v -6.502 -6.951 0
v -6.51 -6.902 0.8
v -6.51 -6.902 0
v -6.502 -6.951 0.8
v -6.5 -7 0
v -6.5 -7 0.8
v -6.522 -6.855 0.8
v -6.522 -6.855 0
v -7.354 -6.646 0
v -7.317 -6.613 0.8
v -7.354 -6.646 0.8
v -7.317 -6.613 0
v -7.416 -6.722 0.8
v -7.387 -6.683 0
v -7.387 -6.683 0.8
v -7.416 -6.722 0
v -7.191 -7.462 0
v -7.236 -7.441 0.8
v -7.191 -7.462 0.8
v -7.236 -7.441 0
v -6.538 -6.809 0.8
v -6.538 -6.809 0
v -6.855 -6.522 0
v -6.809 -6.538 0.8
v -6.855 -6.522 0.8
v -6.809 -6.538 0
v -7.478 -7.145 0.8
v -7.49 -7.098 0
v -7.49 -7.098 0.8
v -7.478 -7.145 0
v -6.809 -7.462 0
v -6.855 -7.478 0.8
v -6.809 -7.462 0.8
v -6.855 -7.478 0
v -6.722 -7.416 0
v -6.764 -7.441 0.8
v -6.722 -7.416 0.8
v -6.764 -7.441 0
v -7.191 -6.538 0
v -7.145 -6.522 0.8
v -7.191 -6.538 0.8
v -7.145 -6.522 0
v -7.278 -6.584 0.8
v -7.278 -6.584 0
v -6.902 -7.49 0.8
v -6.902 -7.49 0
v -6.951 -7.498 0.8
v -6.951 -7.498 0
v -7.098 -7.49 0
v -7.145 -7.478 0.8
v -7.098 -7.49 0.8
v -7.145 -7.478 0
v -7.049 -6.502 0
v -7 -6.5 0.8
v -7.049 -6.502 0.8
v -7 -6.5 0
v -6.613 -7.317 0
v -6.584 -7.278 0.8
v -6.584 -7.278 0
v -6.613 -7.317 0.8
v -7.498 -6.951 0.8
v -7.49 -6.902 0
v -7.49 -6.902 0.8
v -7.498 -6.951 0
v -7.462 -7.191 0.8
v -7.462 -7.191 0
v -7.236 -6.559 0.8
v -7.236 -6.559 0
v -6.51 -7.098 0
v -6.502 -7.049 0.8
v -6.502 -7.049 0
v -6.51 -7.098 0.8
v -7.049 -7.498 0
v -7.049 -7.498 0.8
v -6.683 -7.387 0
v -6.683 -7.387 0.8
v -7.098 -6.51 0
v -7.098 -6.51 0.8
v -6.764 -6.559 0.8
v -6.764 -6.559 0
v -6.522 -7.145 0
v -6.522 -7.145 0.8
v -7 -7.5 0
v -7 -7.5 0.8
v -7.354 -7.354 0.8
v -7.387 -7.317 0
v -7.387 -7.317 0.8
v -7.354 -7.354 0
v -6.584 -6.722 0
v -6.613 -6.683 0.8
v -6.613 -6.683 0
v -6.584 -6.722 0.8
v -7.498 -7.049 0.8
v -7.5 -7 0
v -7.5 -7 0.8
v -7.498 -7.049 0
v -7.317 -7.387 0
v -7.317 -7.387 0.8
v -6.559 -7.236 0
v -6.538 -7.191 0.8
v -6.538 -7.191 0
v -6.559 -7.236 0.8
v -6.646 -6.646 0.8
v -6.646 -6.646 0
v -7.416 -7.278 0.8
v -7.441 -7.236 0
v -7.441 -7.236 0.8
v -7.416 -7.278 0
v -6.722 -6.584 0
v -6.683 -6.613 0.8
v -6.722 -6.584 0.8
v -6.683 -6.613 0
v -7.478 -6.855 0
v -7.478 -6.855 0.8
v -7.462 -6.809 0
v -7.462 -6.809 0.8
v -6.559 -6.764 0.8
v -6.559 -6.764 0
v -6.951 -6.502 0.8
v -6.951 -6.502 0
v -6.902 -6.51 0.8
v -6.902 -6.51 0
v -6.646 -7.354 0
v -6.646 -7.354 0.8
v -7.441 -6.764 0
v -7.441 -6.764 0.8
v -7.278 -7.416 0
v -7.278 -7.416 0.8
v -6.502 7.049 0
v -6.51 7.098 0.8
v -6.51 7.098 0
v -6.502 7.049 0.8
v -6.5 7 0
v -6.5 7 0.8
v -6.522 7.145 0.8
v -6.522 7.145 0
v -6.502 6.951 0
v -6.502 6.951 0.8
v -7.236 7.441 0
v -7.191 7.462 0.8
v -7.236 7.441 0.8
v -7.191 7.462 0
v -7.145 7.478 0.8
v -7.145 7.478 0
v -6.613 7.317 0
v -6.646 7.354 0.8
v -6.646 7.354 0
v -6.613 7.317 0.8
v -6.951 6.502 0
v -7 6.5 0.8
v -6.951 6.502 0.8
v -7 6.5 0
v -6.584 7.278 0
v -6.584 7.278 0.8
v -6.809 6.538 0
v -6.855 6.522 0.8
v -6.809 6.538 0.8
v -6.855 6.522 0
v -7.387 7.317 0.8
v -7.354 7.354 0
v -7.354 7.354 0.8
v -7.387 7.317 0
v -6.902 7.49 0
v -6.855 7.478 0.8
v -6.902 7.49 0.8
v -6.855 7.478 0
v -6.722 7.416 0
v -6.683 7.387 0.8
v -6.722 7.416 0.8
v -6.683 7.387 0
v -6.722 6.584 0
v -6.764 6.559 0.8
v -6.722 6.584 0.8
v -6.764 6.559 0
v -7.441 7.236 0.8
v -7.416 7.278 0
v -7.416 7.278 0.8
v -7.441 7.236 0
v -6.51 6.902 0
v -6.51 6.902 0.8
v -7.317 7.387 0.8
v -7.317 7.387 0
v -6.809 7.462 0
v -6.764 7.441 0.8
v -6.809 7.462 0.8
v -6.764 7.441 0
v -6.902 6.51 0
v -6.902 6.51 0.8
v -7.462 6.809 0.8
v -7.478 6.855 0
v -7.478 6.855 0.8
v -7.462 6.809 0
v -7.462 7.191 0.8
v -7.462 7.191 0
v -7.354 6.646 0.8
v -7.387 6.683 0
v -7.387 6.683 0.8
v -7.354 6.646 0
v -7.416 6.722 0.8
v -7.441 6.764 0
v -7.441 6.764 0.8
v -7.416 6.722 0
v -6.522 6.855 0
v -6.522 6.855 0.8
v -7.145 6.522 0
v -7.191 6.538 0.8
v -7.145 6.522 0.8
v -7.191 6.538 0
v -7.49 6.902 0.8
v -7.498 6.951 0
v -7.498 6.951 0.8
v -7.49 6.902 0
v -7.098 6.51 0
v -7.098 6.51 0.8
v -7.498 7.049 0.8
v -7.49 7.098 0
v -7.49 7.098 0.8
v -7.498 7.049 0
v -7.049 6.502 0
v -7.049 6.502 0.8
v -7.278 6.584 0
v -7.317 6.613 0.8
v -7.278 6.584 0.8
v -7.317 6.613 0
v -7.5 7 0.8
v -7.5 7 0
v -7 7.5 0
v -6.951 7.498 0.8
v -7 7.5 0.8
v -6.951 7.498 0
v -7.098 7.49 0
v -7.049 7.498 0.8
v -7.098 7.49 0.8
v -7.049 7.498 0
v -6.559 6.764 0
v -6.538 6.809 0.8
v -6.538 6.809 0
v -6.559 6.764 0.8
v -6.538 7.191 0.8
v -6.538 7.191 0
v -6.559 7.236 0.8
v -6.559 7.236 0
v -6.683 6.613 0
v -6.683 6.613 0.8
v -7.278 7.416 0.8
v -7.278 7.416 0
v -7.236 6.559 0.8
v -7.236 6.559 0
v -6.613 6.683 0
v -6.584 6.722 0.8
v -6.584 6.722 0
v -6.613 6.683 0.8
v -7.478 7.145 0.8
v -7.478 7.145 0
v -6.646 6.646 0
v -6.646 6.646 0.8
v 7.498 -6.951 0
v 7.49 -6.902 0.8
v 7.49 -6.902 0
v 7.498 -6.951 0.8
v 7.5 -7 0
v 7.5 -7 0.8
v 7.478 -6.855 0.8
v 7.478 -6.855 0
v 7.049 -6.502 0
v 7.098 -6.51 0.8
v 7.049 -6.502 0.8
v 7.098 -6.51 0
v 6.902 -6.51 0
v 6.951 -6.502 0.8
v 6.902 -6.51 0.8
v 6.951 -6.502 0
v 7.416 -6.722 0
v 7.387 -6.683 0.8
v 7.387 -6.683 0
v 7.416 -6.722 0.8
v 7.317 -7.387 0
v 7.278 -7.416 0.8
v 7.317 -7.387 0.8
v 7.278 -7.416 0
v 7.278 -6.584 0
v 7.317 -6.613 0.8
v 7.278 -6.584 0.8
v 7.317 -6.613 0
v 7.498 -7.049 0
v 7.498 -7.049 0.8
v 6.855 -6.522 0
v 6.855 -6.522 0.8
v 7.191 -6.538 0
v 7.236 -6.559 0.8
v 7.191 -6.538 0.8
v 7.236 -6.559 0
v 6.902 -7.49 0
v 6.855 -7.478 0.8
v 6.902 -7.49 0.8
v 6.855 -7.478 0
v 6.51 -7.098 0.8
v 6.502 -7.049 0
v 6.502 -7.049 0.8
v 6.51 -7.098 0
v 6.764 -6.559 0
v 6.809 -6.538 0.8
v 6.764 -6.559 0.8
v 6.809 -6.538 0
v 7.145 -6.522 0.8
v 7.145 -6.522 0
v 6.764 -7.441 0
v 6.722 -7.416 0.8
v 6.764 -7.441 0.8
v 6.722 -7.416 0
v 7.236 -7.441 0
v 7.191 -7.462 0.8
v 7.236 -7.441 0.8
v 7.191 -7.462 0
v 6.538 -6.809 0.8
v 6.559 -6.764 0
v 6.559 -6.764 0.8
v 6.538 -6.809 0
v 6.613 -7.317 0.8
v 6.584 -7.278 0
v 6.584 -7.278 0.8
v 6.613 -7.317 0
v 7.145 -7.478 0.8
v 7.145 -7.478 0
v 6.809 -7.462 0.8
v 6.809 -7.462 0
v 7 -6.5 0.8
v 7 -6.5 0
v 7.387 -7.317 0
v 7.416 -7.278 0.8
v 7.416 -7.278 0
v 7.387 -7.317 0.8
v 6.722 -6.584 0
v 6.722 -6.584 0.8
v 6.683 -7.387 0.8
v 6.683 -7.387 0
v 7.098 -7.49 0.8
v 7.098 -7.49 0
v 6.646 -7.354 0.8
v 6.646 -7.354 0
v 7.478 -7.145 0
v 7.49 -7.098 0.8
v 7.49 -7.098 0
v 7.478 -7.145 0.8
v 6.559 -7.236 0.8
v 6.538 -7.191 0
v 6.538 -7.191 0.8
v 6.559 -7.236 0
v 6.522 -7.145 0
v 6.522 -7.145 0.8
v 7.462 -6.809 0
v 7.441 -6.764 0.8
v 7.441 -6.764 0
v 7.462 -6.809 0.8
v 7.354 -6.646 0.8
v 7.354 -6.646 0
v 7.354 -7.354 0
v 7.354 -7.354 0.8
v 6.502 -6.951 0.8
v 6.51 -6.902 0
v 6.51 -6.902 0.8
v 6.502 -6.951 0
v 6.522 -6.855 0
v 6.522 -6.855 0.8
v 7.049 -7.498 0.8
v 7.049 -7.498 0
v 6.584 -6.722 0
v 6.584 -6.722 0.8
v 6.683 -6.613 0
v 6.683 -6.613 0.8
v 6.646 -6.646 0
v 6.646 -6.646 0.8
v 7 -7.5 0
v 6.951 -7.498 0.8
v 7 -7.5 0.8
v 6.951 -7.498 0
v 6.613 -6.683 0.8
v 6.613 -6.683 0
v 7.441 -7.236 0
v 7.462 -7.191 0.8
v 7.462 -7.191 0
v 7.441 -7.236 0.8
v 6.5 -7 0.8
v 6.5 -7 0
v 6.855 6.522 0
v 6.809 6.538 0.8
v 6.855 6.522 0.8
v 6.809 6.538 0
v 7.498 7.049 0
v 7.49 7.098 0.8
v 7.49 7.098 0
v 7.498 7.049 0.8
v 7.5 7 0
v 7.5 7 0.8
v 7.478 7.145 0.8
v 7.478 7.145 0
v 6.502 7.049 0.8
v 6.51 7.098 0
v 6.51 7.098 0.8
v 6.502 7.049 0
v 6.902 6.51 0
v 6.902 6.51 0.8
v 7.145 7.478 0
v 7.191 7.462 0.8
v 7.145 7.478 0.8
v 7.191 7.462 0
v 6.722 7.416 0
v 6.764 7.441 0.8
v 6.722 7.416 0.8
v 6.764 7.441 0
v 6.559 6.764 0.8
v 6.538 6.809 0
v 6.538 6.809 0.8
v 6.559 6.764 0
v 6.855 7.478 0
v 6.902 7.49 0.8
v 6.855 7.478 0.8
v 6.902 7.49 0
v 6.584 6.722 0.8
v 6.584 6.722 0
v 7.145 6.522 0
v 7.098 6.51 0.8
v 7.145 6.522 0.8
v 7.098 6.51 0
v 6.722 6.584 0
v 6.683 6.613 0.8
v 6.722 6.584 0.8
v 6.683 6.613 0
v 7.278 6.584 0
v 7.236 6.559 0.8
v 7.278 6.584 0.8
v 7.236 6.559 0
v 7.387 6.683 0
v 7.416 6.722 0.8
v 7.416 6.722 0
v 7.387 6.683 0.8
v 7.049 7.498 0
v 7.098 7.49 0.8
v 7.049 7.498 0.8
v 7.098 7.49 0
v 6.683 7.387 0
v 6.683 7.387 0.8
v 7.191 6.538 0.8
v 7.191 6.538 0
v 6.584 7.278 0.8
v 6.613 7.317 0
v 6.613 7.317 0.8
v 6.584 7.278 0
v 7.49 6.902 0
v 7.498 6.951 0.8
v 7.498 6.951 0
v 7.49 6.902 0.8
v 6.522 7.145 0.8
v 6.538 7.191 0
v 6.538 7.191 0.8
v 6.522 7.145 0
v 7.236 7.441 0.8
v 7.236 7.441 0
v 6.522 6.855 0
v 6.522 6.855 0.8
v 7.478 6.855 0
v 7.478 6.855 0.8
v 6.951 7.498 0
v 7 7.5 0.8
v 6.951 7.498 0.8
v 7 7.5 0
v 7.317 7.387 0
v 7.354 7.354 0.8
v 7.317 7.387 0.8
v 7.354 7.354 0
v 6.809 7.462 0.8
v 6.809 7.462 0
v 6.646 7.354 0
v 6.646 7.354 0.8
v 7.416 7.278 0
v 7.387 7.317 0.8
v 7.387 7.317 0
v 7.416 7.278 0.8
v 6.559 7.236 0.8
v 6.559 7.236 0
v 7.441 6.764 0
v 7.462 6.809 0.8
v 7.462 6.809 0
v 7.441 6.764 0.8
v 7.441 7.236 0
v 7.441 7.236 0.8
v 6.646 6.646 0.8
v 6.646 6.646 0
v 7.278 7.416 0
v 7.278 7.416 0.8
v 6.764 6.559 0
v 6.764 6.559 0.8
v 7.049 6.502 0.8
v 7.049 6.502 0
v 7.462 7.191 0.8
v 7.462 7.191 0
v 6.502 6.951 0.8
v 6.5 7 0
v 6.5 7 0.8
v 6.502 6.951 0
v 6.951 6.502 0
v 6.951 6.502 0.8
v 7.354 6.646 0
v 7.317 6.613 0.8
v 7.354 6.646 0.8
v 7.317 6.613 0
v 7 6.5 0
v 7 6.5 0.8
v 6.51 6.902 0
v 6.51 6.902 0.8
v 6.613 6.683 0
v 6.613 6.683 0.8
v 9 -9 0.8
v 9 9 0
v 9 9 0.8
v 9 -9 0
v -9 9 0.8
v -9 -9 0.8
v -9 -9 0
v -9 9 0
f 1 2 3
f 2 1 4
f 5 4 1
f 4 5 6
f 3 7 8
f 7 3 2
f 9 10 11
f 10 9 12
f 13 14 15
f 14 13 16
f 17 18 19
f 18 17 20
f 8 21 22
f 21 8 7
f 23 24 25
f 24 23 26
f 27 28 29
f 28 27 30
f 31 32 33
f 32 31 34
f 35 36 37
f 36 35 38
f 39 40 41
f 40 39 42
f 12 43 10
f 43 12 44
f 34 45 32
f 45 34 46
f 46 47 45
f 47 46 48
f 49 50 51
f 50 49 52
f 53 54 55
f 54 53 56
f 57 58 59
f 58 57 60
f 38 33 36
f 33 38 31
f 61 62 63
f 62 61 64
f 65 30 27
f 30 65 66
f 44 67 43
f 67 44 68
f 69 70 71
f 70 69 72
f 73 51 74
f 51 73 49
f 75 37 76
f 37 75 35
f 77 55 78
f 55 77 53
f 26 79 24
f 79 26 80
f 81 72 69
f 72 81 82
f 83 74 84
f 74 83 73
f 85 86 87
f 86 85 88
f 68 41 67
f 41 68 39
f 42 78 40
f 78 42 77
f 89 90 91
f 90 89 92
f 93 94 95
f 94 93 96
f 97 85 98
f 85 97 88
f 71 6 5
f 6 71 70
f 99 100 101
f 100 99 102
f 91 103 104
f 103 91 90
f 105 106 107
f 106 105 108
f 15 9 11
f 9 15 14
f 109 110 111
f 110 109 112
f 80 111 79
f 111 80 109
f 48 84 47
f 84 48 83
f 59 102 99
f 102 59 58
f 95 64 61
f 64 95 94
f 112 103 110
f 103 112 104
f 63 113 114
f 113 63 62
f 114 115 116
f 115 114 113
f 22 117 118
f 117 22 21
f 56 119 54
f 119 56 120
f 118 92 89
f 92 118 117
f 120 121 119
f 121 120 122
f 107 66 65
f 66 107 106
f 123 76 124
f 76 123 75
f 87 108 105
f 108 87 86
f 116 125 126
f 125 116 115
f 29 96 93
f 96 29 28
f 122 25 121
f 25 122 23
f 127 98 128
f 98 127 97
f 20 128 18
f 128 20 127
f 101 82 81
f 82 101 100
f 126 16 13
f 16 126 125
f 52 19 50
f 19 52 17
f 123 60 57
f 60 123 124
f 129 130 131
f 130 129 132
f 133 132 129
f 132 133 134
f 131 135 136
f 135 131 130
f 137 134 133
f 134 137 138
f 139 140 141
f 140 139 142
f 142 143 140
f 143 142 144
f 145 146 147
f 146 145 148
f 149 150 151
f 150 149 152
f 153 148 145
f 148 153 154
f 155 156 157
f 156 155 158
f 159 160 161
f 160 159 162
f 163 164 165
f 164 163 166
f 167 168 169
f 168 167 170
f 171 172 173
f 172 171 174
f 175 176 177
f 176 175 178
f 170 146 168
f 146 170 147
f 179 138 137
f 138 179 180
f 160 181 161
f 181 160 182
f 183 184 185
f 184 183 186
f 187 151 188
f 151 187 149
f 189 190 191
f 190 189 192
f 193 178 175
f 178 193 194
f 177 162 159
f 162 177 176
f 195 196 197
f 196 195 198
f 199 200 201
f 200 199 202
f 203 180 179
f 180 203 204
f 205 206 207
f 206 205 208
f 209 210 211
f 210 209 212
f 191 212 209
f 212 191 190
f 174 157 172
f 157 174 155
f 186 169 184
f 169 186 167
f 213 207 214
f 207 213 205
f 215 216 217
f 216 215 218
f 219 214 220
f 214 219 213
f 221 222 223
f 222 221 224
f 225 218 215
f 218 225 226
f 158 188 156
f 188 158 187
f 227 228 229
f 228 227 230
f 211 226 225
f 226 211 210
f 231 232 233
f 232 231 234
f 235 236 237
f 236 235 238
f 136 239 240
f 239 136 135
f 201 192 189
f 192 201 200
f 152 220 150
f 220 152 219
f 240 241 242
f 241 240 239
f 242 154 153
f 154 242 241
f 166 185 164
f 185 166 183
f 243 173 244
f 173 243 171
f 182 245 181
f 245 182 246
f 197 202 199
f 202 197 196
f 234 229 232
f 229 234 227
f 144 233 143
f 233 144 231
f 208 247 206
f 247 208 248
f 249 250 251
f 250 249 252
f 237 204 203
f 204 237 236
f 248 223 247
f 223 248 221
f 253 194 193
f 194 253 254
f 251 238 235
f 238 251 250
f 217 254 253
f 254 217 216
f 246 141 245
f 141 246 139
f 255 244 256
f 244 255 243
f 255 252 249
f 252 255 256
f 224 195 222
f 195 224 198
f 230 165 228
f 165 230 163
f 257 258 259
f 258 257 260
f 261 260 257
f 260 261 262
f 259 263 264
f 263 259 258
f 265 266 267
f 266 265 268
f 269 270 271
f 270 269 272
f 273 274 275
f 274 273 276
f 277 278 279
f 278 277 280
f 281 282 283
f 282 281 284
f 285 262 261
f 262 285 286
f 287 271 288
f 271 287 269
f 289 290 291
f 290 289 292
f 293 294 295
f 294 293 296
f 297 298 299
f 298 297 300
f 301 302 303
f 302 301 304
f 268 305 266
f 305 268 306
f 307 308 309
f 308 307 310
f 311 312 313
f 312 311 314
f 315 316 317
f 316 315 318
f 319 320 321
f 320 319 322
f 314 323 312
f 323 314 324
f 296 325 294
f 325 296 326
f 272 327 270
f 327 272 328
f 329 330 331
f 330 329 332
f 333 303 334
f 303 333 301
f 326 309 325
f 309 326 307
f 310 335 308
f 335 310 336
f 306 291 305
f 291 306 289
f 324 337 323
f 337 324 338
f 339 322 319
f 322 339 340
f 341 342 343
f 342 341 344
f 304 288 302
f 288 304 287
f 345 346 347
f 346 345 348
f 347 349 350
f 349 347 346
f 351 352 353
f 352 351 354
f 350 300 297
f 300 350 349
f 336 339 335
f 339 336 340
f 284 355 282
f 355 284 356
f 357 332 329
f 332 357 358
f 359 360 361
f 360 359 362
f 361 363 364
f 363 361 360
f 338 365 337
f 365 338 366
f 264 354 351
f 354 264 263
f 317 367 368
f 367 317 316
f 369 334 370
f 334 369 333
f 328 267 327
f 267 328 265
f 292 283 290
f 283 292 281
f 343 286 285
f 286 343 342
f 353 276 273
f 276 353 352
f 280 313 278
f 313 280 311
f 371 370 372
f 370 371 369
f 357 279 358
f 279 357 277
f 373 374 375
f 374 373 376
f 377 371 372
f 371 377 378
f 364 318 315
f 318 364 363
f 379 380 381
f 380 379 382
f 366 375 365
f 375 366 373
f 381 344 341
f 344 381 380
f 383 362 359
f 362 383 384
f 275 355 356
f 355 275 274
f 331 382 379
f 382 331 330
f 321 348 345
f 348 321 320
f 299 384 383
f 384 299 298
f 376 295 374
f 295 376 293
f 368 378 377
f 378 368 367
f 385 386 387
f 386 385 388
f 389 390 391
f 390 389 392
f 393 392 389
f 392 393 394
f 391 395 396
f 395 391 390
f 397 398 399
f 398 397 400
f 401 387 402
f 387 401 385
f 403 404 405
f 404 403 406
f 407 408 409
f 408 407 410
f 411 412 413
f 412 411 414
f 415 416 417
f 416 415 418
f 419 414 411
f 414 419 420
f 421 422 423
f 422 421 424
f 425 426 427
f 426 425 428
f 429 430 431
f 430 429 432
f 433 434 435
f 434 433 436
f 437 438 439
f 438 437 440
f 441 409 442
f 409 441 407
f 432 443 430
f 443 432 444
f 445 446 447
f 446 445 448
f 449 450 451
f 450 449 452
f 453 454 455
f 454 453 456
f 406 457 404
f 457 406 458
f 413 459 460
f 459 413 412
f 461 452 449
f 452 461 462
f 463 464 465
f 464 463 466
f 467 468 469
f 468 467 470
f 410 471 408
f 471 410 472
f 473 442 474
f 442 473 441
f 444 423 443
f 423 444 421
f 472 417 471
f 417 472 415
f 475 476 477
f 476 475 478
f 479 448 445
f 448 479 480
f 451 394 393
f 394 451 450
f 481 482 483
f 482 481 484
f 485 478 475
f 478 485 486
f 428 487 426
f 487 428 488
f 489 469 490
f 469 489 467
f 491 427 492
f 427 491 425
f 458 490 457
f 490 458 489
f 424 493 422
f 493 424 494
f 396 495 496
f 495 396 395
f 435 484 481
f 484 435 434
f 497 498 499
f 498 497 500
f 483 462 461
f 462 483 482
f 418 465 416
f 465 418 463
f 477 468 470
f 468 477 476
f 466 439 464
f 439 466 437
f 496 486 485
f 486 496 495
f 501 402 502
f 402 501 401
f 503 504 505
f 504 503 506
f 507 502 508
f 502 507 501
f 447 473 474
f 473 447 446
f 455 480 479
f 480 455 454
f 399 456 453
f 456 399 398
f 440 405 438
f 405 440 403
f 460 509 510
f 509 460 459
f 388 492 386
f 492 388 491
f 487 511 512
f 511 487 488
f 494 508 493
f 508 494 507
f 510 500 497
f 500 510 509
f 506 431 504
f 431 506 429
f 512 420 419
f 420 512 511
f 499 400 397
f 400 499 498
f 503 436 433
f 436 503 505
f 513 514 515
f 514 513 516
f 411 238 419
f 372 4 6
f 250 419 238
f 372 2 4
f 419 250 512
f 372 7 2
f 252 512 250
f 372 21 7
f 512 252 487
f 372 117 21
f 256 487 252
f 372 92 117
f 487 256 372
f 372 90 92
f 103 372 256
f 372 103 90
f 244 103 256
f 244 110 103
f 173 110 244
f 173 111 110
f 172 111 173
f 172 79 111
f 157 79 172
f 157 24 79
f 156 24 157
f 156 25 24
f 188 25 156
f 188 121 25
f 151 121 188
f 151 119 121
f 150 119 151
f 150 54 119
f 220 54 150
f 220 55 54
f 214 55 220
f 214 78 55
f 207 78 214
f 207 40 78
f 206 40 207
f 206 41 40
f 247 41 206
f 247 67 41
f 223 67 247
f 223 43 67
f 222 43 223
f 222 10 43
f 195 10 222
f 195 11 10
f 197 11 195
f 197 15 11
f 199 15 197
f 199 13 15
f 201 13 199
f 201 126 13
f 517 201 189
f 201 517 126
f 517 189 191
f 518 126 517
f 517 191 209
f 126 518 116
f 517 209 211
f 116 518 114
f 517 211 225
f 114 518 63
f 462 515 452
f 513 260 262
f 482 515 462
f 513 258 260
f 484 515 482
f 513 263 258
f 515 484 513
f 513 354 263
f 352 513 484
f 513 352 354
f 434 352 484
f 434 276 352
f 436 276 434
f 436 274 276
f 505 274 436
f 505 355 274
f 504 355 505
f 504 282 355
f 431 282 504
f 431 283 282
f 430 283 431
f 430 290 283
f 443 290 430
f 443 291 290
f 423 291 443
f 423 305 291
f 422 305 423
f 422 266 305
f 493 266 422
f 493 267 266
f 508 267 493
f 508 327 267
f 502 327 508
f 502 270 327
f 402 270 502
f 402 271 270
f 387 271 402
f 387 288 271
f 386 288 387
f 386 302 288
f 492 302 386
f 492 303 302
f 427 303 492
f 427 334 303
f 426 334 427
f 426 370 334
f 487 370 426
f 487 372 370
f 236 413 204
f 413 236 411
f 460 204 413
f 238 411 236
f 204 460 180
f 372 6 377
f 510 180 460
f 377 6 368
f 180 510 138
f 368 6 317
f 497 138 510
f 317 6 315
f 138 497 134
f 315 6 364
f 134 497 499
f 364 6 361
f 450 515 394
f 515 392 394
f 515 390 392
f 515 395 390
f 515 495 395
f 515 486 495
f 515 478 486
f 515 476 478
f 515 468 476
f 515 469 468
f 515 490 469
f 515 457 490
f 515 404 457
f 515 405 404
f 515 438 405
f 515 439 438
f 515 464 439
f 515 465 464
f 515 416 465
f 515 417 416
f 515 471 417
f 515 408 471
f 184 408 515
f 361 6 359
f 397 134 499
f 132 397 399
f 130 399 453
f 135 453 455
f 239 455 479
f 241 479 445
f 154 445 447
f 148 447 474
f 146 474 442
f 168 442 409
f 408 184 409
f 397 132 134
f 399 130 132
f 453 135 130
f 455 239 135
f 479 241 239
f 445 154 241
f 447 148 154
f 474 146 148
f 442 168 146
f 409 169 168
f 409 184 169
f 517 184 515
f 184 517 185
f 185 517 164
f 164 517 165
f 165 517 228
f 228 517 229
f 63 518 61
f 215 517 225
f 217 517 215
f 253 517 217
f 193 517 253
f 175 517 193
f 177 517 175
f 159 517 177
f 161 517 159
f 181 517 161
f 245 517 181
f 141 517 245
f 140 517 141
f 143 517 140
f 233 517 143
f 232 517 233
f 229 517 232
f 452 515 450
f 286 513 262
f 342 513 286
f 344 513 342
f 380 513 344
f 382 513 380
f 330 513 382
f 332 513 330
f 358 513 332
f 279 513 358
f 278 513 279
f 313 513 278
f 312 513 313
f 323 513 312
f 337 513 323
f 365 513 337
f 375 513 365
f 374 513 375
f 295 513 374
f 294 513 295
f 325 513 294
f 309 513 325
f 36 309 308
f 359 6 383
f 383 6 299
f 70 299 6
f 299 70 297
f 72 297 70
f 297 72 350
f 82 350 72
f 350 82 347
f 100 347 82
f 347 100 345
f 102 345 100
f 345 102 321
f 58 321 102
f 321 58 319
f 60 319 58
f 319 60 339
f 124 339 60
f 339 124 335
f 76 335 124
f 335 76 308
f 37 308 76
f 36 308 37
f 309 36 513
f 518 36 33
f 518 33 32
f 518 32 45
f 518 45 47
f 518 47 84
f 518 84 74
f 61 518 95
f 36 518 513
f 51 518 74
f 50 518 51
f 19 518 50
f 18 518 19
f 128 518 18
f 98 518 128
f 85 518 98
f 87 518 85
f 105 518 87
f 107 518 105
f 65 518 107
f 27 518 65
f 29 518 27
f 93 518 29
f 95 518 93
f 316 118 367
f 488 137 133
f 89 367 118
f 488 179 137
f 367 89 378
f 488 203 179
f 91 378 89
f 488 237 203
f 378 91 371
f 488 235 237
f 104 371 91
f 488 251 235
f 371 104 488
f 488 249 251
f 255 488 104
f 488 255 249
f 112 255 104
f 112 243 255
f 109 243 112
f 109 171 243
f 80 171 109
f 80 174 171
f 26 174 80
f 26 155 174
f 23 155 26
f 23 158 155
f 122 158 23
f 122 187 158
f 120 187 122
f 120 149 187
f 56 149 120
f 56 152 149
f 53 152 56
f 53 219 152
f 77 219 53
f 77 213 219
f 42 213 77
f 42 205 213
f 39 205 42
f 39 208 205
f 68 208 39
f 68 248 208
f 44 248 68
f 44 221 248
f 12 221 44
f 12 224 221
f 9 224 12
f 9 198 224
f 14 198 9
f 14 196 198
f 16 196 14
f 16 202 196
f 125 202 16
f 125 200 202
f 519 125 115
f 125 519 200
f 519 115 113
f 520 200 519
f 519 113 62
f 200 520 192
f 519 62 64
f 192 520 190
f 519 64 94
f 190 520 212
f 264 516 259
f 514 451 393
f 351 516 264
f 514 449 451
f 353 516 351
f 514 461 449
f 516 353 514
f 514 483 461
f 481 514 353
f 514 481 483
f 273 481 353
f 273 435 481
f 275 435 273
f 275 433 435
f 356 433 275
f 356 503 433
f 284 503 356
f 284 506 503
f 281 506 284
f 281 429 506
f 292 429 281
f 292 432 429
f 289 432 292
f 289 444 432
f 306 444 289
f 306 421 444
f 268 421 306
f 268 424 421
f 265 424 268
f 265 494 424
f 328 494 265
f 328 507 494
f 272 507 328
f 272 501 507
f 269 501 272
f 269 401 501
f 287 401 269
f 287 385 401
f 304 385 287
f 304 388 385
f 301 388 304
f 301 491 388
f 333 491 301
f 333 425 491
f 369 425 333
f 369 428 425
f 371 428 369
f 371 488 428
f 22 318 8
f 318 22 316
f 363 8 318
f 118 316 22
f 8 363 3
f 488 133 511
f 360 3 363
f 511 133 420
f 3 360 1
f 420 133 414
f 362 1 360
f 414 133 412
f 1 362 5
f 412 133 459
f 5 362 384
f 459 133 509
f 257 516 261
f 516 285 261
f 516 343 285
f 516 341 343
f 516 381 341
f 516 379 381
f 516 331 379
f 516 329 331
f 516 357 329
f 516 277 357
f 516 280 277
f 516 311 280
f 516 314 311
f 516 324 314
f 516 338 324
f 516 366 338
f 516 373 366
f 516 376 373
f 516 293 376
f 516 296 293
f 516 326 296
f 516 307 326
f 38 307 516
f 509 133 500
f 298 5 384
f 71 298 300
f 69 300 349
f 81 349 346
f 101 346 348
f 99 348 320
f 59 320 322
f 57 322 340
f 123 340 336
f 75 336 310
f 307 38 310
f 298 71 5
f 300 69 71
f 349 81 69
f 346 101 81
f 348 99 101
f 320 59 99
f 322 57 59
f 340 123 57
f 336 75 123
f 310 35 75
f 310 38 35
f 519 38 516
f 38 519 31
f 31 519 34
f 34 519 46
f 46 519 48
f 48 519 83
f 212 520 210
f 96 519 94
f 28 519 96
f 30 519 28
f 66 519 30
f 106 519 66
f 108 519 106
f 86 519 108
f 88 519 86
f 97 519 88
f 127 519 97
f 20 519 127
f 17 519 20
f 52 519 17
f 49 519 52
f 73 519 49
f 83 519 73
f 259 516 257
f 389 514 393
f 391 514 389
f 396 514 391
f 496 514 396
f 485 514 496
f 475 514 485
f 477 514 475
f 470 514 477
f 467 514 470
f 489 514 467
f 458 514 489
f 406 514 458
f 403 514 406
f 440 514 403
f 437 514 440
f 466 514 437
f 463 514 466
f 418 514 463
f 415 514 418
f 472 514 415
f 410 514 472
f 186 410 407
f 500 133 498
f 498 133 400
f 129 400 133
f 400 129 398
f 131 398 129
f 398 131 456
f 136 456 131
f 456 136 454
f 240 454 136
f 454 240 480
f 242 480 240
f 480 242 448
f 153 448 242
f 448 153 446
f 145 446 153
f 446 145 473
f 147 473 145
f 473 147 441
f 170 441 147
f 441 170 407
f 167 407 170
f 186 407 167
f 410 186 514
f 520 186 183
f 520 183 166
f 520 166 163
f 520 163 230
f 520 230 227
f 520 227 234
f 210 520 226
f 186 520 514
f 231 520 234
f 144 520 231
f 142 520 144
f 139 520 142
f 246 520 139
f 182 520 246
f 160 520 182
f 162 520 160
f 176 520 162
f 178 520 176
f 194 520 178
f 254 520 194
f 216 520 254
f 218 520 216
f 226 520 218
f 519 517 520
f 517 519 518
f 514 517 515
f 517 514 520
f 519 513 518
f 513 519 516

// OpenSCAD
// 18mm x 18mm PCB, 0.8mm thick — single connected solid
$fn = 64;

// Parameters
pcb_size      = 18.0;
pcb_thickness = 0.8;

// Optional mounting holes (set to 0 to disable)
hole_diameter = 1.0;
hole_offset   = 2.0;

// Main PCB solid (perfect square outline)
module pcb_solid() {
    difference() {
        // Board body: exact 18 x 18 x 0.8
        translate([0, 0, pcb_thickness/2])
            cube([pcb_size, pcb_size, pcb_thickness], center=true);

        // Mounting holes: through-holes, fully cut
        if (hole_diameter > 0) {
            for (x = [-1, 1], y = [-1, 1]) {
                translate([x*(pcb_size/2 - hole_offset),
                           y*(pcb_size/2 - hole_offset),
                           pcb_thickness/2])
                    cylinder(h=pcb_thickness + 0.2, d=hole_diameter, center=true);
            }
        }
    }
}

pcb_solid();
